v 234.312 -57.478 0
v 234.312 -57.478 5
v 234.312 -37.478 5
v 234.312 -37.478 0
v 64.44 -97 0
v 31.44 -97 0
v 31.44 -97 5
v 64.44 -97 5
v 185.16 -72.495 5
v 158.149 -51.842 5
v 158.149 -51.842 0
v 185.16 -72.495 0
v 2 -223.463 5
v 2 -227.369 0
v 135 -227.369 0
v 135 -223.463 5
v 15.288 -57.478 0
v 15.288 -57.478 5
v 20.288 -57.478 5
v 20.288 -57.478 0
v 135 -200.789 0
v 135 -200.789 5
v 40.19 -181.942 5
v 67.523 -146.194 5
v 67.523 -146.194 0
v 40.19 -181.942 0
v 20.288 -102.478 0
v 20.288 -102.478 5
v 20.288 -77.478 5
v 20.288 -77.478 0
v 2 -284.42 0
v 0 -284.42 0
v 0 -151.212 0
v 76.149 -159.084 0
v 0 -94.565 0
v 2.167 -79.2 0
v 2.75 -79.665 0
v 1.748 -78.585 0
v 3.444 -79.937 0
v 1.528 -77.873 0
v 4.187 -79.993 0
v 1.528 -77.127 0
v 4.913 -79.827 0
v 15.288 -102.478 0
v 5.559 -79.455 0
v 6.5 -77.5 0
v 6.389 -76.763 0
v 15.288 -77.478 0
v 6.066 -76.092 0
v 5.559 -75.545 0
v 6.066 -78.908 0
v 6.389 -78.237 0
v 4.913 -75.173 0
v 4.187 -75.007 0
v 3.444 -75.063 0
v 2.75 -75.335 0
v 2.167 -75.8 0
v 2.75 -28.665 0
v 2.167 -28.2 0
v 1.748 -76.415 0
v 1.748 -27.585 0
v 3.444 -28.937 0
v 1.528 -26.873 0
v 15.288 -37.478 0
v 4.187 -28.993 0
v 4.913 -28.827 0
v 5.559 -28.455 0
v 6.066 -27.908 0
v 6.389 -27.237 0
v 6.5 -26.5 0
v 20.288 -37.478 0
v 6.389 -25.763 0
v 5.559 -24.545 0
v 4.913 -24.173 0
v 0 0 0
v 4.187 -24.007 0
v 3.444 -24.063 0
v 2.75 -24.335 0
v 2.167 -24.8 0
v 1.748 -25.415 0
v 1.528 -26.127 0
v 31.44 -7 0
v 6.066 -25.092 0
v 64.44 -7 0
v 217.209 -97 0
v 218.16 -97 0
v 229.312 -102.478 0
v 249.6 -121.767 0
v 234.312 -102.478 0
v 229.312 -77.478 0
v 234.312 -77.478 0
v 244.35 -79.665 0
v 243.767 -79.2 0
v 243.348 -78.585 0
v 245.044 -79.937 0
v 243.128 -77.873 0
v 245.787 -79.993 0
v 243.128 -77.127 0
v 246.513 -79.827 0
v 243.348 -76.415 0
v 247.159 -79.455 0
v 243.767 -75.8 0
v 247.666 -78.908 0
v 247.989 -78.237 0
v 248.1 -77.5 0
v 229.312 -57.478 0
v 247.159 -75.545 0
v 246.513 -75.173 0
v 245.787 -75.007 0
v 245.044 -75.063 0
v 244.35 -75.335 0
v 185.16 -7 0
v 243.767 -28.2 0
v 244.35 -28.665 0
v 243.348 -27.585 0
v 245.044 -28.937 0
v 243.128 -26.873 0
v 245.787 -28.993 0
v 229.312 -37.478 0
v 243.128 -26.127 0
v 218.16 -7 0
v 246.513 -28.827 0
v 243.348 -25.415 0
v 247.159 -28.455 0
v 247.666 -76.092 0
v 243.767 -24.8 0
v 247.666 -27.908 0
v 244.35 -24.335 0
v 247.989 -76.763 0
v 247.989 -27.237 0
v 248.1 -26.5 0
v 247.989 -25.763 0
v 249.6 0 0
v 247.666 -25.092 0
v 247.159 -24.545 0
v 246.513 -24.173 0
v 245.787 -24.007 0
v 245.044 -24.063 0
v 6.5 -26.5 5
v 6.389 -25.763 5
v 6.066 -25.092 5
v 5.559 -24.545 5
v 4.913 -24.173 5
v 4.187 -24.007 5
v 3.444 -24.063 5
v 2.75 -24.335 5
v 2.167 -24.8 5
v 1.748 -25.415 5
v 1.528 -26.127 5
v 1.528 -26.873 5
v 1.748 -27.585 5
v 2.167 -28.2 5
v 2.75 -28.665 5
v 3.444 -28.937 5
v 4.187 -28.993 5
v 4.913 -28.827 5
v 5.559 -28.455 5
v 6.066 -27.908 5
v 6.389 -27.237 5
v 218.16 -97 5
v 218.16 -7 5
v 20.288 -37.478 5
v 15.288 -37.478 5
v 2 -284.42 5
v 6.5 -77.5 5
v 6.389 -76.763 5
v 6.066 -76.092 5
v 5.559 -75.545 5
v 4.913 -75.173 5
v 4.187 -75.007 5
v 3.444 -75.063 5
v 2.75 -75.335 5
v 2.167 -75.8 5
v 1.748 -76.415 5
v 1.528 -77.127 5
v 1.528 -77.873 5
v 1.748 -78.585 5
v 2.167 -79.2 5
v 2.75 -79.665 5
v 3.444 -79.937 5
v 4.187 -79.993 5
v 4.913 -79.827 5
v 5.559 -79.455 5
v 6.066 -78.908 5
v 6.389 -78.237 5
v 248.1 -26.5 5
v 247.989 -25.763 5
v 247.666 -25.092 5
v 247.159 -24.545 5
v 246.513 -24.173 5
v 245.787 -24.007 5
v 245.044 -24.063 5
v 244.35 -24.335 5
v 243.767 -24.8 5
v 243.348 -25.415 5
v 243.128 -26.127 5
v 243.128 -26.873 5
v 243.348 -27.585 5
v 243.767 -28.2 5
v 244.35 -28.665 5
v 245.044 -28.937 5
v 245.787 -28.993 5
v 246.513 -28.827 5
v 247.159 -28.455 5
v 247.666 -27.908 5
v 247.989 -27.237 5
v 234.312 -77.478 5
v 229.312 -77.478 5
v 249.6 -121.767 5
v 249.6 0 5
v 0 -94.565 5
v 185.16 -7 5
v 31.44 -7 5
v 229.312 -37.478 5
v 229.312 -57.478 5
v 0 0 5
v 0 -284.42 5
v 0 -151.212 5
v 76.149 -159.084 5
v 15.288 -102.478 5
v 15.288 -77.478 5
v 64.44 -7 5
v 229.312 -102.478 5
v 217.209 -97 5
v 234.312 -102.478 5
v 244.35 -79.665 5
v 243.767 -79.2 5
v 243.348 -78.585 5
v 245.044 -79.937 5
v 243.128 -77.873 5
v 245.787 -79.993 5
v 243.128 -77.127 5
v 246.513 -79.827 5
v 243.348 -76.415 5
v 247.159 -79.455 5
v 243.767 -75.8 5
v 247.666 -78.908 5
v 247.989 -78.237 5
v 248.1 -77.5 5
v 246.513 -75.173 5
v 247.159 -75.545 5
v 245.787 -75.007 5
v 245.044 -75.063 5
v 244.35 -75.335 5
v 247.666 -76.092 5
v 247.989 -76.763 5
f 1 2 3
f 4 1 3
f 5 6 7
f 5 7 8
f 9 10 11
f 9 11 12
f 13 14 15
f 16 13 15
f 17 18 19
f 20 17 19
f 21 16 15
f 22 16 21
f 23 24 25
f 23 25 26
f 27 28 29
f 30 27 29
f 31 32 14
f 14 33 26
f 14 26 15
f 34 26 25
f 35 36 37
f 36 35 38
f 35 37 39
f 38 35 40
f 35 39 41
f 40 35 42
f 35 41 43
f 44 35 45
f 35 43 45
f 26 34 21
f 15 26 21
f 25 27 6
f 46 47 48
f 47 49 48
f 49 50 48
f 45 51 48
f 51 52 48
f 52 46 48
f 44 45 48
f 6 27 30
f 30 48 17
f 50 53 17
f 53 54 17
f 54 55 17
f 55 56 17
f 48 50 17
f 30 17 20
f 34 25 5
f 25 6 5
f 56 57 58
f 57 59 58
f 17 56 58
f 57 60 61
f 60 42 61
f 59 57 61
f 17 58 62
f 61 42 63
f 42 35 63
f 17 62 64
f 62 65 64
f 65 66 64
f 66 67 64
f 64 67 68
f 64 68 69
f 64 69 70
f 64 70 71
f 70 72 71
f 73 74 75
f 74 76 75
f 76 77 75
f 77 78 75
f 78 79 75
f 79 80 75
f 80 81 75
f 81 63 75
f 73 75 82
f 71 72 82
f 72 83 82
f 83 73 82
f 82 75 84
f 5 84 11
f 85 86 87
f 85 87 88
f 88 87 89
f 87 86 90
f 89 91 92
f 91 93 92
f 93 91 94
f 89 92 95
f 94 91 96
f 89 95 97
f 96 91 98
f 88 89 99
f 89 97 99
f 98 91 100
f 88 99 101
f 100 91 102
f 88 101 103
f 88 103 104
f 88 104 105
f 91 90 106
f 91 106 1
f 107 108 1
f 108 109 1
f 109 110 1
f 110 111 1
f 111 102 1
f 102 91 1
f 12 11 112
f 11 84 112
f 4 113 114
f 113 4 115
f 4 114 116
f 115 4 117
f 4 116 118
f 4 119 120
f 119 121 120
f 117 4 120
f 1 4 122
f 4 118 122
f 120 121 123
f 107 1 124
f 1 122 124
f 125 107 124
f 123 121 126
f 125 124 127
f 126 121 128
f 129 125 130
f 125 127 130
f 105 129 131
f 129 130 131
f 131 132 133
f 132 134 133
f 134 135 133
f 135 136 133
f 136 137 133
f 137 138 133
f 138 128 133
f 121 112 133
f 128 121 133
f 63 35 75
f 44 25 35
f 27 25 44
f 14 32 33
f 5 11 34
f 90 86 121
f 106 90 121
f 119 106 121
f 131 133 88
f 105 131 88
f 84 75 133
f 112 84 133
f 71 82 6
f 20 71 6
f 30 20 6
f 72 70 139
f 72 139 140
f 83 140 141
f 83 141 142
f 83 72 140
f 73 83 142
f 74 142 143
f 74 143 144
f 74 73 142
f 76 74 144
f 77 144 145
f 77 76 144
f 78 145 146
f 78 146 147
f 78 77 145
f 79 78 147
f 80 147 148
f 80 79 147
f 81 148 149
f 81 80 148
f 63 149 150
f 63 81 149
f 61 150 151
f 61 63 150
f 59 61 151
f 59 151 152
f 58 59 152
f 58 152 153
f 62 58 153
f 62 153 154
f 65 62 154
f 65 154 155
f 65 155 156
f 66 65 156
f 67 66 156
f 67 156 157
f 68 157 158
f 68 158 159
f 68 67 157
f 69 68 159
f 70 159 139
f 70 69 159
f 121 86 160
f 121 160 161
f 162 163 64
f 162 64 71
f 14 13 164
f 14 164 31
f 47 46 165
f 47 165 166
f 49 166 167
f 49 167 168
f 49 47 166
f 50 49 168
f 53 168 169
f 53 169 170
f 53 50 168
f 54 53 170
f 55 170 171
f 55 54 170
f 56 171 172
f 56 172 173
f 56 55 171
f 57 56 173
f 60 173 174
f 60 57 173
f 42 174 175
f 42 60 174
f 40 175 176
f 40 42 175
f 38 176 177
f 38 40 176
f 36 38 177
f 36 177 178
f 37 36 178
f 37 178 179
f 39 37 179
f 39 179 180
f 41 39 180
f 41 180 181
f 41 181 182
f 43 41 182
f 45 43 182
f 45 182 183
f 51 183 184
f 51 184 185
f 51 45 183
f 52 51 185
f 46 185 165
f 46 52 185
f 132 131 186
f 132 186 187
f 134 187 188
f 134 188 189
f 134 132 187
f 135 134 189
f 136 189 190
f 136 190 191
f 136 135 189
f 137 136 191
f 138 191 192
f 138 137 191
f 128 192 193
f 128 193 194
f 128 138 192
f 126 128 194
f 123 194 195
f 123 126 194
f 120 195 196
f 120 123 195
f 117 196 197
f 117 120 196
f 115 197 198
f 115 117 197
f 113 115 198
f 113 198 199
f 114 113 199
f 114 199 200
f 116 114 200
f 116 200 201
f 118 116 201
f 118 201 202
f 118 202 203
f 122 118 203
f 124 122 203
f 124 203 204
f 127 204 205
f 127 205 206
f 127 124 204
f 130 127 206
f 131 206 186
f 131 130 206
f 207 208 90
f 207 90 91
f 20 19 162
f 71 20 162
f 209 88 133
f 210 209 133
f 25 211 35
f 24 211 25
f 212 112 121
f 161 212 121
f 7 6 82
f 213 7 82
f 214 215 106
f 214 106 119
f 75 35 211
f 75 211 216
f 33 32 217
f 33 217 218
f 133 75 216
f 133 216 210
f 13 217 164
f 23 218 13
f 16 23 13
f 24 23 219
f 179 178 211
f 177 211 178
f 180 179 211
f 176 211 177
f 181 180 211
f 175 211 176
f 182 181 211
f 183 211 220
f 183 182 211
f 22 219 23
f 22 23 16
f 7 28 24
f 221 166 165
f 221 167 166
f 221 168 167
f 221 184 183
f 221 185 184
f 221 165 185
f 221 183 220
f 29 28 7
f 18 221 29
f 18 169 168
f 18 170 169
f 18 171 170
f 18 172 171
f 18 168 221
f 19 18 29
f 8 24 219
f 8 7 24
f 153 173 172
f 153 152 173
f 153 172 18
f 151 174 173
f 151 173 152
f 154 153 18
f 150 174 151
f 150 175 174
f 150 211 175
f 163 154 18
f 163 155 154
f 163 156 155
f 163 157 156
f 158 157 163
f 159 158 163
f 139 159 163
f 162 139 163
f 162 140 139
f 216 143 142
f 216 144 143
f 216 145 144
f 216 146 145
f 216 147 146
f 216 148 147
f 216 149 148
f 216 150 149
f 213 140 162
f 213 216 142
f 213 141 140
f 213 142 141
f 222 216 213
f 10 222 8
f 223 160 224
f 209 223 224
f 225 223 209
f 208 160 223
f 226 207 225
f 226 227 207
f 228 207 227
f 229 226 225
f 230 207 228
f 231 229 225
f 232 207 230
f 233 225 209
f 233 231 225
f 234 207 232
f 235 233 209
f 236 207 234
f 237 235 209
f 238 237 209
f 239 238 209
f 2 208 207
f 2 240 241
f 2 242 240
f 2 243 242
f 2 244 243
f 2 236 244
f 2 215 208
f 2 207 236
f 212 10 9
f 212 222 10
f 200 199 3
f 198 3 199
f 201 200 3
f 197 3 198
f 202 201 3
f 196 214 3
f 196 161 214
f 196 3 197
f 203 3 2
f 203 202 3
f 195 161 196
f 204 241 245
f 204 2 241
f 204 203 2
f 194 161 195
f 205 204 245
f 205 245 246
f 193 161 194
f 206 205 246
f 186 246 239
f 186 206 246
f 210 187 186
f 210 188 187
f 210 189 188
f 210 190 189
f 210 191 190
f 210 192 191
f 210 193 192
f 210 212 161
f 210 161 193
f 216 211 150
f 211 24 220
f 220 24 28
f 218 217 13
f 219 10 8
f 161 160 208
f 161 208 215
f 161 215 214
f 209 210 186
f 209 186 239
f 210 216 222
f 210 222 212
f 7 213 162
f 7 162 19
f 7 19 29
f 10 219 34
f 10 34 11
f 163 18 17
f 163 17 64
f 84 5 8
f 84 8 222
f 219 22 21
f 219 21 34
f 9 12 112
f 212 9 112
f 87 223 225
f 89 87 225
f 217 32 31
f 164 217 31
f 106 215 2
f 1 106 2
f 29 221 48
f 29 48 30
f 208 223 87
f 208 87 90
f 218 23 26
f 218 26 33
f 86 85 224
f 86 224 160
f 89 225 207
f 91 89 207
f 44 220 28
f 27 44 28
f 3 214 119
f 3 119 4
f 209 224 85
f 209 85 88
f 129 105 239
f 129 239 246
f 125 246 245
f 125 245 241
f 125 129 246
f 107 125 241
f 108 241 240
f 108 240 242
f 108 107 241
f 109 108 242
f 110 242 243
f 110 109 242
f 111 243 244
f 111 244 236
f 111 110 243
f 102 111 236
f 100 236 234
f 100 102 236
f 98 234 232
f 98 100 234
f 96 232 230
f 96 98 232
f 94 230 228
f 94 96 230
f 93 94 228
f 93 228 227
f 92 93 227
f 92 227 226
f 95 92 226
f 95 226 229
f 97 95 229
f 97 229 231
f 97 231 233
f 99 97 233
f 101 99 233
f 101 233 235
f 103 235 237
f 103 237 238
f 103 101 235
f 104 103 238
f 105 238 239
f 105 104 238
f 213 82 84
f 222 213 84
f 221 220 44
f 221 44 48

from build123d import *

# Parameters (mm, degrees)
SKETCH1_W           = 249.6
SKETCH1_H           = 284.42
SKETCH1_R           = 2.5
SKETCH1_W_2         = 33
SKETCH1_H_2         = 90
BOSS_EXTRUDE1_DEPTH = 5
SKETCH4_W           = 133
SKETCH4_H           = 244.46665057
CUT_EXTRUDE2_DEPTH  = 49.034766894
CUT_EXTRUDE3_DEPTH  = 6
CUT_EXTRUDE4_DEPTH  = 6
SKETCH7_W           = 5
SKETCH7_H           = 20
SKETCH7_H_2         = 25
CUT_EXTRUDE5_DEPTH  = 6


with BuildPart() as part:
    # Sketch1 → Boss-Extrude1 (new body)
    with BuildSketch(Plane.XY):
        with Locations((124.8, -142.21)):
            Rectangle(SKETCH1_W, SKETCH1_H)
        with Locations((245.6, -26.5)):
            Circle(SKETCH1_R, mode=Mode.SUBTRACT)
        with Locations((245.6, -77.5)):
            Circle(SKETCH1_R, mode=Mode.SUBTRACT)
        with Locations((4, -77.5)):
            Circle(SKETCH1_R, mode=Mode.SUBTRACT)
        with Locations((4, -26.5)):
            Circle(SKETCH1_R, mode=Mode.SUBTRACT)
        with Locations((201.66, -52)):
            Rectangle(SKETCH1_W_2, SKETCH1_H_2, mode=Mode.SUBTRACT)
        with Locations((47.94, -52)):
            Rectangle(SKETCH1_W_2, SKETCH1_H_2, mode=Mode.SUBTRACT)
    extrude(amount=BOSS_EXTRUDE1_DEPTH)

    # Sketch4 → Cut-Extrude2 (cut, through all)
    with BuildSketch(Plane(origin=(0, -141.18753923, 110.307795042), x_dir=(1, 0, 0), z_dir=(0, 0.788010754, -0.615661475))):
        with Locations((68.5, 84.166930672)):
            Rectangle(SKETCH4_W, SKETCH4_H)
    extrude(amount=-CUT_EXTRUDE2_DEPTH, mode=Mode.SUBTRACT)

    # Sketch5 → Cut-Extrude3 (cut, through all)
    with BuildSketch(Plane.XY.offset(5)):
        Polygon((76.149175745, -159.084342324), (158.149444505, -51.841832454), (328.08312673, -181.777318211), (207.31876811, -339.716714228), (135, -284.42), (135, -200.788988557), align=None)
    extrude(amount=-CUT_EXTRUDE3_DEPTH, mode=Mode.SUBTRACT)

    # Sketch6 → Cut-Extrude4 (cut, through all)
    with BuildSketch(Plane.XY.offset(5)):
        Polygon((0, -94.564658056), (67.52306177, -146.194456905), (40.18963885, -181.941960195), (-27.33342292, -130.312161346), align=None)
    extrude(amount=-CUT_EXTRUDE4_DEPTH, mode=Mode.SUBTRACT)

    # Sketch7 → Cut-Extrude5 (cut, through all)
    with BuildSketch(Plane.XY.offset(5)):
        with Locations((17.788155616, -47.477871486)):
            Rectangle(SKETCH7_W, SKETCH7_H)
        with Locations((231.811844384, -47.477871486)):
            Rectangle(SKETCH7_W, SKETCH7_H)
        with Locations((17.788155616, -89.977871486)):
            Rectangle(SKETCH7_W, SKETCH7_H_2)
        with Locations((231.811844384, -89.977871486)):
            Rectangle(SKETCH7_W, SKETCH7_H_2)
    extrude(amount=-CUT_EXTRUDE5_DEPTH, mode=Mode.SUBTRACT)


solid = part.part
